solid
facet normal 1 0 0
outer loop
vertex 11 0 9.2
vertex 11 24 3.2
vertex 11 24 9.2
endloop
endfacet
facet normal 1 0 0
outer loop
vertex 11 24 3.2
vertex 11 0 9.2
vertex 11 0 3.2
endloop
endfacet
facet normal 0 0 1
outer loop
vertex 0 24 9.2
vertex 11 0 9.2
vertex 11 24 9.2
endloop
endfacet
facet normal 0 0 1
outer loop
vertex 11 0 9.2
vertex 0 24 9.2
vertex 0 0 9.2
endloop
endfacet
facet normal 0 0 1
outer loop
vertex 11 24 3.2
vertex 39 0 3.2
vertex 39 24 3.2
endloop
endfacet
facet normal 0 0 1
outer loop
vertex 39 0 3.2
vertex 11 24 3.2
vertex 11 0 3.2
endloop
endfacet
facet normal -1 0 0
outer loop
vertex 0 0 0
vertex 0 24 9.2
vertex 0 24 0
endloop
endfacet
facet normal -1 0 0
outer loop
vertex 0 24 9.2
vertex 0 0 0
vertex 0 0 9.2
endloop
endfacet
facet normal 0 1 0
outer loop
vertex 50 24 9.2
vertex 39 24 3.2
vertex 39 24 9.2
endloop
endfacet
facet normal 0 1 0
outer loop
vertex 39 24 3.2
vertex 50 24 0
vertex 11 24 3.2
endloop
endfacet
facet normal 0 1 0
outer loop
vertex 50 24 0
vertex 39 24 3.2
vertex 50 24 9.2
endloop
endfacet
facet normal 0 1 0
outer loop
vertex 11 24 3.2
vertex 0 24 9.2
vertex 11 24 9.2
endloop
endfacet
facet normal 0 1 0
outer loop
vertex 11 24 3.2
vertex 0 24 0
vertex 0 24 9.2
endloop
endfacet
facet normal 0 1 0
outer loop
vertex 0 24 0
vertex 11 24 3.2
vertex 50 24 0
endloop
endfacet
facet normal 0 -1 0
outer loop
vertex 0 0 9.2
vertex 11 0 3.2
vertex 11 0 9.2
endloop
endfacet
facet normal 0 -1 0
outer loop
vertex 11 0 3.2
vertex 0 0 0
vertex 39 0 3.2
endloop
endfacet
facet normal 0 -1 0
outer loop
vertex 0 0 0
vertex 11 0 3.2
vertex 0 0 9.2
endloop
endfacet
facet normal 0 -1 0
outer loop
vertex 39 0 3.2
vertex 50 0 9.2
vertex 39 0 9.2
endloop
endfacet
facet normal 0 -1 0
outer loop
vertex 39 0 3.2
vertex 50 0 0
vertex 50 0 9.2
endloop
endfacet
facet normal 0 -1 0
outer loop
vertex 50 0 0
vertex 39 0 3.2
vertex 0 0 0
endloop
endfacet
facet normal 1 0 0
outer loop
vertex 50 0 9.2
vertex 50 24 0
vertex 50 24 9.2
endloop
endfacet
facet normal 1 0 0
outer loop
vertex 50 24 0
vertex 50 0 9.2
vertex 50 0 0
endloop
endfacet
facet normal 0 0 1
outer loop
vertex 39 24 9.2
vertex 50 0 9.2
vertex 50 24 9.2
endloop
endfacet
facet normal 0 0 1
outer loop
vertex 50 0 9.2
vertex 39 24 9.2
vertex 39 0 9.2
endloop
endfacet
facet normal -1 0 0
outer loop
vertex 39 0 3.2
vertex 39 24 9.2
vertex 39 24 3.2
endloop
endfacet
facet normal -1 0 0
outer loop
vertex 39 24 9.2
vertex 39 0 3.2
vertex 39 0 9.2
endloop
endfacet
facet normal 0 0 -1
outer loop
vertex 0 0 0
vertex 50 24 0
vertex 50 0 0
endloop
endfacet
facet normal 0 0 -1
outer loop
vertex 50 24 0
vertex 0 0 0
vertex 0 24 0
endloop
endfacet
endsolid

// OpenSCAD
// Small Stage 2B gauge for the approximately 5 mm rear bump.
// Print with the broad bridge on the bed and the two feet upward. To test,
// invert it: both feet touch stationary wall and the bridge spans the bump.
// The bump location and width are still UNMEASURED.
include <parameters.scad>

assert(rear_rib_test_width == rear_rib_test_bridge_width
       + 2 * rear_rib_test_foot_width);
assert(rear_rib_test_bridge_width > 0);

module rear_rib_clearance_test() {
    union() {
        cube([rear_rib_test_width, rear_rib_test_height,
              rear_rib_test_base_thickness], center = false);
        for (side = [0, 1])
            translate([side * (rear_rib_test_width - rear_rib_test_foot_width),
                       0, rear_rib_test_base_thickness])
                cube([rear_rib_test_foot_width, rear_rib_test_height,
                      rear_plate_standoff]);
    }
}

rear_rib_clearance_test();
